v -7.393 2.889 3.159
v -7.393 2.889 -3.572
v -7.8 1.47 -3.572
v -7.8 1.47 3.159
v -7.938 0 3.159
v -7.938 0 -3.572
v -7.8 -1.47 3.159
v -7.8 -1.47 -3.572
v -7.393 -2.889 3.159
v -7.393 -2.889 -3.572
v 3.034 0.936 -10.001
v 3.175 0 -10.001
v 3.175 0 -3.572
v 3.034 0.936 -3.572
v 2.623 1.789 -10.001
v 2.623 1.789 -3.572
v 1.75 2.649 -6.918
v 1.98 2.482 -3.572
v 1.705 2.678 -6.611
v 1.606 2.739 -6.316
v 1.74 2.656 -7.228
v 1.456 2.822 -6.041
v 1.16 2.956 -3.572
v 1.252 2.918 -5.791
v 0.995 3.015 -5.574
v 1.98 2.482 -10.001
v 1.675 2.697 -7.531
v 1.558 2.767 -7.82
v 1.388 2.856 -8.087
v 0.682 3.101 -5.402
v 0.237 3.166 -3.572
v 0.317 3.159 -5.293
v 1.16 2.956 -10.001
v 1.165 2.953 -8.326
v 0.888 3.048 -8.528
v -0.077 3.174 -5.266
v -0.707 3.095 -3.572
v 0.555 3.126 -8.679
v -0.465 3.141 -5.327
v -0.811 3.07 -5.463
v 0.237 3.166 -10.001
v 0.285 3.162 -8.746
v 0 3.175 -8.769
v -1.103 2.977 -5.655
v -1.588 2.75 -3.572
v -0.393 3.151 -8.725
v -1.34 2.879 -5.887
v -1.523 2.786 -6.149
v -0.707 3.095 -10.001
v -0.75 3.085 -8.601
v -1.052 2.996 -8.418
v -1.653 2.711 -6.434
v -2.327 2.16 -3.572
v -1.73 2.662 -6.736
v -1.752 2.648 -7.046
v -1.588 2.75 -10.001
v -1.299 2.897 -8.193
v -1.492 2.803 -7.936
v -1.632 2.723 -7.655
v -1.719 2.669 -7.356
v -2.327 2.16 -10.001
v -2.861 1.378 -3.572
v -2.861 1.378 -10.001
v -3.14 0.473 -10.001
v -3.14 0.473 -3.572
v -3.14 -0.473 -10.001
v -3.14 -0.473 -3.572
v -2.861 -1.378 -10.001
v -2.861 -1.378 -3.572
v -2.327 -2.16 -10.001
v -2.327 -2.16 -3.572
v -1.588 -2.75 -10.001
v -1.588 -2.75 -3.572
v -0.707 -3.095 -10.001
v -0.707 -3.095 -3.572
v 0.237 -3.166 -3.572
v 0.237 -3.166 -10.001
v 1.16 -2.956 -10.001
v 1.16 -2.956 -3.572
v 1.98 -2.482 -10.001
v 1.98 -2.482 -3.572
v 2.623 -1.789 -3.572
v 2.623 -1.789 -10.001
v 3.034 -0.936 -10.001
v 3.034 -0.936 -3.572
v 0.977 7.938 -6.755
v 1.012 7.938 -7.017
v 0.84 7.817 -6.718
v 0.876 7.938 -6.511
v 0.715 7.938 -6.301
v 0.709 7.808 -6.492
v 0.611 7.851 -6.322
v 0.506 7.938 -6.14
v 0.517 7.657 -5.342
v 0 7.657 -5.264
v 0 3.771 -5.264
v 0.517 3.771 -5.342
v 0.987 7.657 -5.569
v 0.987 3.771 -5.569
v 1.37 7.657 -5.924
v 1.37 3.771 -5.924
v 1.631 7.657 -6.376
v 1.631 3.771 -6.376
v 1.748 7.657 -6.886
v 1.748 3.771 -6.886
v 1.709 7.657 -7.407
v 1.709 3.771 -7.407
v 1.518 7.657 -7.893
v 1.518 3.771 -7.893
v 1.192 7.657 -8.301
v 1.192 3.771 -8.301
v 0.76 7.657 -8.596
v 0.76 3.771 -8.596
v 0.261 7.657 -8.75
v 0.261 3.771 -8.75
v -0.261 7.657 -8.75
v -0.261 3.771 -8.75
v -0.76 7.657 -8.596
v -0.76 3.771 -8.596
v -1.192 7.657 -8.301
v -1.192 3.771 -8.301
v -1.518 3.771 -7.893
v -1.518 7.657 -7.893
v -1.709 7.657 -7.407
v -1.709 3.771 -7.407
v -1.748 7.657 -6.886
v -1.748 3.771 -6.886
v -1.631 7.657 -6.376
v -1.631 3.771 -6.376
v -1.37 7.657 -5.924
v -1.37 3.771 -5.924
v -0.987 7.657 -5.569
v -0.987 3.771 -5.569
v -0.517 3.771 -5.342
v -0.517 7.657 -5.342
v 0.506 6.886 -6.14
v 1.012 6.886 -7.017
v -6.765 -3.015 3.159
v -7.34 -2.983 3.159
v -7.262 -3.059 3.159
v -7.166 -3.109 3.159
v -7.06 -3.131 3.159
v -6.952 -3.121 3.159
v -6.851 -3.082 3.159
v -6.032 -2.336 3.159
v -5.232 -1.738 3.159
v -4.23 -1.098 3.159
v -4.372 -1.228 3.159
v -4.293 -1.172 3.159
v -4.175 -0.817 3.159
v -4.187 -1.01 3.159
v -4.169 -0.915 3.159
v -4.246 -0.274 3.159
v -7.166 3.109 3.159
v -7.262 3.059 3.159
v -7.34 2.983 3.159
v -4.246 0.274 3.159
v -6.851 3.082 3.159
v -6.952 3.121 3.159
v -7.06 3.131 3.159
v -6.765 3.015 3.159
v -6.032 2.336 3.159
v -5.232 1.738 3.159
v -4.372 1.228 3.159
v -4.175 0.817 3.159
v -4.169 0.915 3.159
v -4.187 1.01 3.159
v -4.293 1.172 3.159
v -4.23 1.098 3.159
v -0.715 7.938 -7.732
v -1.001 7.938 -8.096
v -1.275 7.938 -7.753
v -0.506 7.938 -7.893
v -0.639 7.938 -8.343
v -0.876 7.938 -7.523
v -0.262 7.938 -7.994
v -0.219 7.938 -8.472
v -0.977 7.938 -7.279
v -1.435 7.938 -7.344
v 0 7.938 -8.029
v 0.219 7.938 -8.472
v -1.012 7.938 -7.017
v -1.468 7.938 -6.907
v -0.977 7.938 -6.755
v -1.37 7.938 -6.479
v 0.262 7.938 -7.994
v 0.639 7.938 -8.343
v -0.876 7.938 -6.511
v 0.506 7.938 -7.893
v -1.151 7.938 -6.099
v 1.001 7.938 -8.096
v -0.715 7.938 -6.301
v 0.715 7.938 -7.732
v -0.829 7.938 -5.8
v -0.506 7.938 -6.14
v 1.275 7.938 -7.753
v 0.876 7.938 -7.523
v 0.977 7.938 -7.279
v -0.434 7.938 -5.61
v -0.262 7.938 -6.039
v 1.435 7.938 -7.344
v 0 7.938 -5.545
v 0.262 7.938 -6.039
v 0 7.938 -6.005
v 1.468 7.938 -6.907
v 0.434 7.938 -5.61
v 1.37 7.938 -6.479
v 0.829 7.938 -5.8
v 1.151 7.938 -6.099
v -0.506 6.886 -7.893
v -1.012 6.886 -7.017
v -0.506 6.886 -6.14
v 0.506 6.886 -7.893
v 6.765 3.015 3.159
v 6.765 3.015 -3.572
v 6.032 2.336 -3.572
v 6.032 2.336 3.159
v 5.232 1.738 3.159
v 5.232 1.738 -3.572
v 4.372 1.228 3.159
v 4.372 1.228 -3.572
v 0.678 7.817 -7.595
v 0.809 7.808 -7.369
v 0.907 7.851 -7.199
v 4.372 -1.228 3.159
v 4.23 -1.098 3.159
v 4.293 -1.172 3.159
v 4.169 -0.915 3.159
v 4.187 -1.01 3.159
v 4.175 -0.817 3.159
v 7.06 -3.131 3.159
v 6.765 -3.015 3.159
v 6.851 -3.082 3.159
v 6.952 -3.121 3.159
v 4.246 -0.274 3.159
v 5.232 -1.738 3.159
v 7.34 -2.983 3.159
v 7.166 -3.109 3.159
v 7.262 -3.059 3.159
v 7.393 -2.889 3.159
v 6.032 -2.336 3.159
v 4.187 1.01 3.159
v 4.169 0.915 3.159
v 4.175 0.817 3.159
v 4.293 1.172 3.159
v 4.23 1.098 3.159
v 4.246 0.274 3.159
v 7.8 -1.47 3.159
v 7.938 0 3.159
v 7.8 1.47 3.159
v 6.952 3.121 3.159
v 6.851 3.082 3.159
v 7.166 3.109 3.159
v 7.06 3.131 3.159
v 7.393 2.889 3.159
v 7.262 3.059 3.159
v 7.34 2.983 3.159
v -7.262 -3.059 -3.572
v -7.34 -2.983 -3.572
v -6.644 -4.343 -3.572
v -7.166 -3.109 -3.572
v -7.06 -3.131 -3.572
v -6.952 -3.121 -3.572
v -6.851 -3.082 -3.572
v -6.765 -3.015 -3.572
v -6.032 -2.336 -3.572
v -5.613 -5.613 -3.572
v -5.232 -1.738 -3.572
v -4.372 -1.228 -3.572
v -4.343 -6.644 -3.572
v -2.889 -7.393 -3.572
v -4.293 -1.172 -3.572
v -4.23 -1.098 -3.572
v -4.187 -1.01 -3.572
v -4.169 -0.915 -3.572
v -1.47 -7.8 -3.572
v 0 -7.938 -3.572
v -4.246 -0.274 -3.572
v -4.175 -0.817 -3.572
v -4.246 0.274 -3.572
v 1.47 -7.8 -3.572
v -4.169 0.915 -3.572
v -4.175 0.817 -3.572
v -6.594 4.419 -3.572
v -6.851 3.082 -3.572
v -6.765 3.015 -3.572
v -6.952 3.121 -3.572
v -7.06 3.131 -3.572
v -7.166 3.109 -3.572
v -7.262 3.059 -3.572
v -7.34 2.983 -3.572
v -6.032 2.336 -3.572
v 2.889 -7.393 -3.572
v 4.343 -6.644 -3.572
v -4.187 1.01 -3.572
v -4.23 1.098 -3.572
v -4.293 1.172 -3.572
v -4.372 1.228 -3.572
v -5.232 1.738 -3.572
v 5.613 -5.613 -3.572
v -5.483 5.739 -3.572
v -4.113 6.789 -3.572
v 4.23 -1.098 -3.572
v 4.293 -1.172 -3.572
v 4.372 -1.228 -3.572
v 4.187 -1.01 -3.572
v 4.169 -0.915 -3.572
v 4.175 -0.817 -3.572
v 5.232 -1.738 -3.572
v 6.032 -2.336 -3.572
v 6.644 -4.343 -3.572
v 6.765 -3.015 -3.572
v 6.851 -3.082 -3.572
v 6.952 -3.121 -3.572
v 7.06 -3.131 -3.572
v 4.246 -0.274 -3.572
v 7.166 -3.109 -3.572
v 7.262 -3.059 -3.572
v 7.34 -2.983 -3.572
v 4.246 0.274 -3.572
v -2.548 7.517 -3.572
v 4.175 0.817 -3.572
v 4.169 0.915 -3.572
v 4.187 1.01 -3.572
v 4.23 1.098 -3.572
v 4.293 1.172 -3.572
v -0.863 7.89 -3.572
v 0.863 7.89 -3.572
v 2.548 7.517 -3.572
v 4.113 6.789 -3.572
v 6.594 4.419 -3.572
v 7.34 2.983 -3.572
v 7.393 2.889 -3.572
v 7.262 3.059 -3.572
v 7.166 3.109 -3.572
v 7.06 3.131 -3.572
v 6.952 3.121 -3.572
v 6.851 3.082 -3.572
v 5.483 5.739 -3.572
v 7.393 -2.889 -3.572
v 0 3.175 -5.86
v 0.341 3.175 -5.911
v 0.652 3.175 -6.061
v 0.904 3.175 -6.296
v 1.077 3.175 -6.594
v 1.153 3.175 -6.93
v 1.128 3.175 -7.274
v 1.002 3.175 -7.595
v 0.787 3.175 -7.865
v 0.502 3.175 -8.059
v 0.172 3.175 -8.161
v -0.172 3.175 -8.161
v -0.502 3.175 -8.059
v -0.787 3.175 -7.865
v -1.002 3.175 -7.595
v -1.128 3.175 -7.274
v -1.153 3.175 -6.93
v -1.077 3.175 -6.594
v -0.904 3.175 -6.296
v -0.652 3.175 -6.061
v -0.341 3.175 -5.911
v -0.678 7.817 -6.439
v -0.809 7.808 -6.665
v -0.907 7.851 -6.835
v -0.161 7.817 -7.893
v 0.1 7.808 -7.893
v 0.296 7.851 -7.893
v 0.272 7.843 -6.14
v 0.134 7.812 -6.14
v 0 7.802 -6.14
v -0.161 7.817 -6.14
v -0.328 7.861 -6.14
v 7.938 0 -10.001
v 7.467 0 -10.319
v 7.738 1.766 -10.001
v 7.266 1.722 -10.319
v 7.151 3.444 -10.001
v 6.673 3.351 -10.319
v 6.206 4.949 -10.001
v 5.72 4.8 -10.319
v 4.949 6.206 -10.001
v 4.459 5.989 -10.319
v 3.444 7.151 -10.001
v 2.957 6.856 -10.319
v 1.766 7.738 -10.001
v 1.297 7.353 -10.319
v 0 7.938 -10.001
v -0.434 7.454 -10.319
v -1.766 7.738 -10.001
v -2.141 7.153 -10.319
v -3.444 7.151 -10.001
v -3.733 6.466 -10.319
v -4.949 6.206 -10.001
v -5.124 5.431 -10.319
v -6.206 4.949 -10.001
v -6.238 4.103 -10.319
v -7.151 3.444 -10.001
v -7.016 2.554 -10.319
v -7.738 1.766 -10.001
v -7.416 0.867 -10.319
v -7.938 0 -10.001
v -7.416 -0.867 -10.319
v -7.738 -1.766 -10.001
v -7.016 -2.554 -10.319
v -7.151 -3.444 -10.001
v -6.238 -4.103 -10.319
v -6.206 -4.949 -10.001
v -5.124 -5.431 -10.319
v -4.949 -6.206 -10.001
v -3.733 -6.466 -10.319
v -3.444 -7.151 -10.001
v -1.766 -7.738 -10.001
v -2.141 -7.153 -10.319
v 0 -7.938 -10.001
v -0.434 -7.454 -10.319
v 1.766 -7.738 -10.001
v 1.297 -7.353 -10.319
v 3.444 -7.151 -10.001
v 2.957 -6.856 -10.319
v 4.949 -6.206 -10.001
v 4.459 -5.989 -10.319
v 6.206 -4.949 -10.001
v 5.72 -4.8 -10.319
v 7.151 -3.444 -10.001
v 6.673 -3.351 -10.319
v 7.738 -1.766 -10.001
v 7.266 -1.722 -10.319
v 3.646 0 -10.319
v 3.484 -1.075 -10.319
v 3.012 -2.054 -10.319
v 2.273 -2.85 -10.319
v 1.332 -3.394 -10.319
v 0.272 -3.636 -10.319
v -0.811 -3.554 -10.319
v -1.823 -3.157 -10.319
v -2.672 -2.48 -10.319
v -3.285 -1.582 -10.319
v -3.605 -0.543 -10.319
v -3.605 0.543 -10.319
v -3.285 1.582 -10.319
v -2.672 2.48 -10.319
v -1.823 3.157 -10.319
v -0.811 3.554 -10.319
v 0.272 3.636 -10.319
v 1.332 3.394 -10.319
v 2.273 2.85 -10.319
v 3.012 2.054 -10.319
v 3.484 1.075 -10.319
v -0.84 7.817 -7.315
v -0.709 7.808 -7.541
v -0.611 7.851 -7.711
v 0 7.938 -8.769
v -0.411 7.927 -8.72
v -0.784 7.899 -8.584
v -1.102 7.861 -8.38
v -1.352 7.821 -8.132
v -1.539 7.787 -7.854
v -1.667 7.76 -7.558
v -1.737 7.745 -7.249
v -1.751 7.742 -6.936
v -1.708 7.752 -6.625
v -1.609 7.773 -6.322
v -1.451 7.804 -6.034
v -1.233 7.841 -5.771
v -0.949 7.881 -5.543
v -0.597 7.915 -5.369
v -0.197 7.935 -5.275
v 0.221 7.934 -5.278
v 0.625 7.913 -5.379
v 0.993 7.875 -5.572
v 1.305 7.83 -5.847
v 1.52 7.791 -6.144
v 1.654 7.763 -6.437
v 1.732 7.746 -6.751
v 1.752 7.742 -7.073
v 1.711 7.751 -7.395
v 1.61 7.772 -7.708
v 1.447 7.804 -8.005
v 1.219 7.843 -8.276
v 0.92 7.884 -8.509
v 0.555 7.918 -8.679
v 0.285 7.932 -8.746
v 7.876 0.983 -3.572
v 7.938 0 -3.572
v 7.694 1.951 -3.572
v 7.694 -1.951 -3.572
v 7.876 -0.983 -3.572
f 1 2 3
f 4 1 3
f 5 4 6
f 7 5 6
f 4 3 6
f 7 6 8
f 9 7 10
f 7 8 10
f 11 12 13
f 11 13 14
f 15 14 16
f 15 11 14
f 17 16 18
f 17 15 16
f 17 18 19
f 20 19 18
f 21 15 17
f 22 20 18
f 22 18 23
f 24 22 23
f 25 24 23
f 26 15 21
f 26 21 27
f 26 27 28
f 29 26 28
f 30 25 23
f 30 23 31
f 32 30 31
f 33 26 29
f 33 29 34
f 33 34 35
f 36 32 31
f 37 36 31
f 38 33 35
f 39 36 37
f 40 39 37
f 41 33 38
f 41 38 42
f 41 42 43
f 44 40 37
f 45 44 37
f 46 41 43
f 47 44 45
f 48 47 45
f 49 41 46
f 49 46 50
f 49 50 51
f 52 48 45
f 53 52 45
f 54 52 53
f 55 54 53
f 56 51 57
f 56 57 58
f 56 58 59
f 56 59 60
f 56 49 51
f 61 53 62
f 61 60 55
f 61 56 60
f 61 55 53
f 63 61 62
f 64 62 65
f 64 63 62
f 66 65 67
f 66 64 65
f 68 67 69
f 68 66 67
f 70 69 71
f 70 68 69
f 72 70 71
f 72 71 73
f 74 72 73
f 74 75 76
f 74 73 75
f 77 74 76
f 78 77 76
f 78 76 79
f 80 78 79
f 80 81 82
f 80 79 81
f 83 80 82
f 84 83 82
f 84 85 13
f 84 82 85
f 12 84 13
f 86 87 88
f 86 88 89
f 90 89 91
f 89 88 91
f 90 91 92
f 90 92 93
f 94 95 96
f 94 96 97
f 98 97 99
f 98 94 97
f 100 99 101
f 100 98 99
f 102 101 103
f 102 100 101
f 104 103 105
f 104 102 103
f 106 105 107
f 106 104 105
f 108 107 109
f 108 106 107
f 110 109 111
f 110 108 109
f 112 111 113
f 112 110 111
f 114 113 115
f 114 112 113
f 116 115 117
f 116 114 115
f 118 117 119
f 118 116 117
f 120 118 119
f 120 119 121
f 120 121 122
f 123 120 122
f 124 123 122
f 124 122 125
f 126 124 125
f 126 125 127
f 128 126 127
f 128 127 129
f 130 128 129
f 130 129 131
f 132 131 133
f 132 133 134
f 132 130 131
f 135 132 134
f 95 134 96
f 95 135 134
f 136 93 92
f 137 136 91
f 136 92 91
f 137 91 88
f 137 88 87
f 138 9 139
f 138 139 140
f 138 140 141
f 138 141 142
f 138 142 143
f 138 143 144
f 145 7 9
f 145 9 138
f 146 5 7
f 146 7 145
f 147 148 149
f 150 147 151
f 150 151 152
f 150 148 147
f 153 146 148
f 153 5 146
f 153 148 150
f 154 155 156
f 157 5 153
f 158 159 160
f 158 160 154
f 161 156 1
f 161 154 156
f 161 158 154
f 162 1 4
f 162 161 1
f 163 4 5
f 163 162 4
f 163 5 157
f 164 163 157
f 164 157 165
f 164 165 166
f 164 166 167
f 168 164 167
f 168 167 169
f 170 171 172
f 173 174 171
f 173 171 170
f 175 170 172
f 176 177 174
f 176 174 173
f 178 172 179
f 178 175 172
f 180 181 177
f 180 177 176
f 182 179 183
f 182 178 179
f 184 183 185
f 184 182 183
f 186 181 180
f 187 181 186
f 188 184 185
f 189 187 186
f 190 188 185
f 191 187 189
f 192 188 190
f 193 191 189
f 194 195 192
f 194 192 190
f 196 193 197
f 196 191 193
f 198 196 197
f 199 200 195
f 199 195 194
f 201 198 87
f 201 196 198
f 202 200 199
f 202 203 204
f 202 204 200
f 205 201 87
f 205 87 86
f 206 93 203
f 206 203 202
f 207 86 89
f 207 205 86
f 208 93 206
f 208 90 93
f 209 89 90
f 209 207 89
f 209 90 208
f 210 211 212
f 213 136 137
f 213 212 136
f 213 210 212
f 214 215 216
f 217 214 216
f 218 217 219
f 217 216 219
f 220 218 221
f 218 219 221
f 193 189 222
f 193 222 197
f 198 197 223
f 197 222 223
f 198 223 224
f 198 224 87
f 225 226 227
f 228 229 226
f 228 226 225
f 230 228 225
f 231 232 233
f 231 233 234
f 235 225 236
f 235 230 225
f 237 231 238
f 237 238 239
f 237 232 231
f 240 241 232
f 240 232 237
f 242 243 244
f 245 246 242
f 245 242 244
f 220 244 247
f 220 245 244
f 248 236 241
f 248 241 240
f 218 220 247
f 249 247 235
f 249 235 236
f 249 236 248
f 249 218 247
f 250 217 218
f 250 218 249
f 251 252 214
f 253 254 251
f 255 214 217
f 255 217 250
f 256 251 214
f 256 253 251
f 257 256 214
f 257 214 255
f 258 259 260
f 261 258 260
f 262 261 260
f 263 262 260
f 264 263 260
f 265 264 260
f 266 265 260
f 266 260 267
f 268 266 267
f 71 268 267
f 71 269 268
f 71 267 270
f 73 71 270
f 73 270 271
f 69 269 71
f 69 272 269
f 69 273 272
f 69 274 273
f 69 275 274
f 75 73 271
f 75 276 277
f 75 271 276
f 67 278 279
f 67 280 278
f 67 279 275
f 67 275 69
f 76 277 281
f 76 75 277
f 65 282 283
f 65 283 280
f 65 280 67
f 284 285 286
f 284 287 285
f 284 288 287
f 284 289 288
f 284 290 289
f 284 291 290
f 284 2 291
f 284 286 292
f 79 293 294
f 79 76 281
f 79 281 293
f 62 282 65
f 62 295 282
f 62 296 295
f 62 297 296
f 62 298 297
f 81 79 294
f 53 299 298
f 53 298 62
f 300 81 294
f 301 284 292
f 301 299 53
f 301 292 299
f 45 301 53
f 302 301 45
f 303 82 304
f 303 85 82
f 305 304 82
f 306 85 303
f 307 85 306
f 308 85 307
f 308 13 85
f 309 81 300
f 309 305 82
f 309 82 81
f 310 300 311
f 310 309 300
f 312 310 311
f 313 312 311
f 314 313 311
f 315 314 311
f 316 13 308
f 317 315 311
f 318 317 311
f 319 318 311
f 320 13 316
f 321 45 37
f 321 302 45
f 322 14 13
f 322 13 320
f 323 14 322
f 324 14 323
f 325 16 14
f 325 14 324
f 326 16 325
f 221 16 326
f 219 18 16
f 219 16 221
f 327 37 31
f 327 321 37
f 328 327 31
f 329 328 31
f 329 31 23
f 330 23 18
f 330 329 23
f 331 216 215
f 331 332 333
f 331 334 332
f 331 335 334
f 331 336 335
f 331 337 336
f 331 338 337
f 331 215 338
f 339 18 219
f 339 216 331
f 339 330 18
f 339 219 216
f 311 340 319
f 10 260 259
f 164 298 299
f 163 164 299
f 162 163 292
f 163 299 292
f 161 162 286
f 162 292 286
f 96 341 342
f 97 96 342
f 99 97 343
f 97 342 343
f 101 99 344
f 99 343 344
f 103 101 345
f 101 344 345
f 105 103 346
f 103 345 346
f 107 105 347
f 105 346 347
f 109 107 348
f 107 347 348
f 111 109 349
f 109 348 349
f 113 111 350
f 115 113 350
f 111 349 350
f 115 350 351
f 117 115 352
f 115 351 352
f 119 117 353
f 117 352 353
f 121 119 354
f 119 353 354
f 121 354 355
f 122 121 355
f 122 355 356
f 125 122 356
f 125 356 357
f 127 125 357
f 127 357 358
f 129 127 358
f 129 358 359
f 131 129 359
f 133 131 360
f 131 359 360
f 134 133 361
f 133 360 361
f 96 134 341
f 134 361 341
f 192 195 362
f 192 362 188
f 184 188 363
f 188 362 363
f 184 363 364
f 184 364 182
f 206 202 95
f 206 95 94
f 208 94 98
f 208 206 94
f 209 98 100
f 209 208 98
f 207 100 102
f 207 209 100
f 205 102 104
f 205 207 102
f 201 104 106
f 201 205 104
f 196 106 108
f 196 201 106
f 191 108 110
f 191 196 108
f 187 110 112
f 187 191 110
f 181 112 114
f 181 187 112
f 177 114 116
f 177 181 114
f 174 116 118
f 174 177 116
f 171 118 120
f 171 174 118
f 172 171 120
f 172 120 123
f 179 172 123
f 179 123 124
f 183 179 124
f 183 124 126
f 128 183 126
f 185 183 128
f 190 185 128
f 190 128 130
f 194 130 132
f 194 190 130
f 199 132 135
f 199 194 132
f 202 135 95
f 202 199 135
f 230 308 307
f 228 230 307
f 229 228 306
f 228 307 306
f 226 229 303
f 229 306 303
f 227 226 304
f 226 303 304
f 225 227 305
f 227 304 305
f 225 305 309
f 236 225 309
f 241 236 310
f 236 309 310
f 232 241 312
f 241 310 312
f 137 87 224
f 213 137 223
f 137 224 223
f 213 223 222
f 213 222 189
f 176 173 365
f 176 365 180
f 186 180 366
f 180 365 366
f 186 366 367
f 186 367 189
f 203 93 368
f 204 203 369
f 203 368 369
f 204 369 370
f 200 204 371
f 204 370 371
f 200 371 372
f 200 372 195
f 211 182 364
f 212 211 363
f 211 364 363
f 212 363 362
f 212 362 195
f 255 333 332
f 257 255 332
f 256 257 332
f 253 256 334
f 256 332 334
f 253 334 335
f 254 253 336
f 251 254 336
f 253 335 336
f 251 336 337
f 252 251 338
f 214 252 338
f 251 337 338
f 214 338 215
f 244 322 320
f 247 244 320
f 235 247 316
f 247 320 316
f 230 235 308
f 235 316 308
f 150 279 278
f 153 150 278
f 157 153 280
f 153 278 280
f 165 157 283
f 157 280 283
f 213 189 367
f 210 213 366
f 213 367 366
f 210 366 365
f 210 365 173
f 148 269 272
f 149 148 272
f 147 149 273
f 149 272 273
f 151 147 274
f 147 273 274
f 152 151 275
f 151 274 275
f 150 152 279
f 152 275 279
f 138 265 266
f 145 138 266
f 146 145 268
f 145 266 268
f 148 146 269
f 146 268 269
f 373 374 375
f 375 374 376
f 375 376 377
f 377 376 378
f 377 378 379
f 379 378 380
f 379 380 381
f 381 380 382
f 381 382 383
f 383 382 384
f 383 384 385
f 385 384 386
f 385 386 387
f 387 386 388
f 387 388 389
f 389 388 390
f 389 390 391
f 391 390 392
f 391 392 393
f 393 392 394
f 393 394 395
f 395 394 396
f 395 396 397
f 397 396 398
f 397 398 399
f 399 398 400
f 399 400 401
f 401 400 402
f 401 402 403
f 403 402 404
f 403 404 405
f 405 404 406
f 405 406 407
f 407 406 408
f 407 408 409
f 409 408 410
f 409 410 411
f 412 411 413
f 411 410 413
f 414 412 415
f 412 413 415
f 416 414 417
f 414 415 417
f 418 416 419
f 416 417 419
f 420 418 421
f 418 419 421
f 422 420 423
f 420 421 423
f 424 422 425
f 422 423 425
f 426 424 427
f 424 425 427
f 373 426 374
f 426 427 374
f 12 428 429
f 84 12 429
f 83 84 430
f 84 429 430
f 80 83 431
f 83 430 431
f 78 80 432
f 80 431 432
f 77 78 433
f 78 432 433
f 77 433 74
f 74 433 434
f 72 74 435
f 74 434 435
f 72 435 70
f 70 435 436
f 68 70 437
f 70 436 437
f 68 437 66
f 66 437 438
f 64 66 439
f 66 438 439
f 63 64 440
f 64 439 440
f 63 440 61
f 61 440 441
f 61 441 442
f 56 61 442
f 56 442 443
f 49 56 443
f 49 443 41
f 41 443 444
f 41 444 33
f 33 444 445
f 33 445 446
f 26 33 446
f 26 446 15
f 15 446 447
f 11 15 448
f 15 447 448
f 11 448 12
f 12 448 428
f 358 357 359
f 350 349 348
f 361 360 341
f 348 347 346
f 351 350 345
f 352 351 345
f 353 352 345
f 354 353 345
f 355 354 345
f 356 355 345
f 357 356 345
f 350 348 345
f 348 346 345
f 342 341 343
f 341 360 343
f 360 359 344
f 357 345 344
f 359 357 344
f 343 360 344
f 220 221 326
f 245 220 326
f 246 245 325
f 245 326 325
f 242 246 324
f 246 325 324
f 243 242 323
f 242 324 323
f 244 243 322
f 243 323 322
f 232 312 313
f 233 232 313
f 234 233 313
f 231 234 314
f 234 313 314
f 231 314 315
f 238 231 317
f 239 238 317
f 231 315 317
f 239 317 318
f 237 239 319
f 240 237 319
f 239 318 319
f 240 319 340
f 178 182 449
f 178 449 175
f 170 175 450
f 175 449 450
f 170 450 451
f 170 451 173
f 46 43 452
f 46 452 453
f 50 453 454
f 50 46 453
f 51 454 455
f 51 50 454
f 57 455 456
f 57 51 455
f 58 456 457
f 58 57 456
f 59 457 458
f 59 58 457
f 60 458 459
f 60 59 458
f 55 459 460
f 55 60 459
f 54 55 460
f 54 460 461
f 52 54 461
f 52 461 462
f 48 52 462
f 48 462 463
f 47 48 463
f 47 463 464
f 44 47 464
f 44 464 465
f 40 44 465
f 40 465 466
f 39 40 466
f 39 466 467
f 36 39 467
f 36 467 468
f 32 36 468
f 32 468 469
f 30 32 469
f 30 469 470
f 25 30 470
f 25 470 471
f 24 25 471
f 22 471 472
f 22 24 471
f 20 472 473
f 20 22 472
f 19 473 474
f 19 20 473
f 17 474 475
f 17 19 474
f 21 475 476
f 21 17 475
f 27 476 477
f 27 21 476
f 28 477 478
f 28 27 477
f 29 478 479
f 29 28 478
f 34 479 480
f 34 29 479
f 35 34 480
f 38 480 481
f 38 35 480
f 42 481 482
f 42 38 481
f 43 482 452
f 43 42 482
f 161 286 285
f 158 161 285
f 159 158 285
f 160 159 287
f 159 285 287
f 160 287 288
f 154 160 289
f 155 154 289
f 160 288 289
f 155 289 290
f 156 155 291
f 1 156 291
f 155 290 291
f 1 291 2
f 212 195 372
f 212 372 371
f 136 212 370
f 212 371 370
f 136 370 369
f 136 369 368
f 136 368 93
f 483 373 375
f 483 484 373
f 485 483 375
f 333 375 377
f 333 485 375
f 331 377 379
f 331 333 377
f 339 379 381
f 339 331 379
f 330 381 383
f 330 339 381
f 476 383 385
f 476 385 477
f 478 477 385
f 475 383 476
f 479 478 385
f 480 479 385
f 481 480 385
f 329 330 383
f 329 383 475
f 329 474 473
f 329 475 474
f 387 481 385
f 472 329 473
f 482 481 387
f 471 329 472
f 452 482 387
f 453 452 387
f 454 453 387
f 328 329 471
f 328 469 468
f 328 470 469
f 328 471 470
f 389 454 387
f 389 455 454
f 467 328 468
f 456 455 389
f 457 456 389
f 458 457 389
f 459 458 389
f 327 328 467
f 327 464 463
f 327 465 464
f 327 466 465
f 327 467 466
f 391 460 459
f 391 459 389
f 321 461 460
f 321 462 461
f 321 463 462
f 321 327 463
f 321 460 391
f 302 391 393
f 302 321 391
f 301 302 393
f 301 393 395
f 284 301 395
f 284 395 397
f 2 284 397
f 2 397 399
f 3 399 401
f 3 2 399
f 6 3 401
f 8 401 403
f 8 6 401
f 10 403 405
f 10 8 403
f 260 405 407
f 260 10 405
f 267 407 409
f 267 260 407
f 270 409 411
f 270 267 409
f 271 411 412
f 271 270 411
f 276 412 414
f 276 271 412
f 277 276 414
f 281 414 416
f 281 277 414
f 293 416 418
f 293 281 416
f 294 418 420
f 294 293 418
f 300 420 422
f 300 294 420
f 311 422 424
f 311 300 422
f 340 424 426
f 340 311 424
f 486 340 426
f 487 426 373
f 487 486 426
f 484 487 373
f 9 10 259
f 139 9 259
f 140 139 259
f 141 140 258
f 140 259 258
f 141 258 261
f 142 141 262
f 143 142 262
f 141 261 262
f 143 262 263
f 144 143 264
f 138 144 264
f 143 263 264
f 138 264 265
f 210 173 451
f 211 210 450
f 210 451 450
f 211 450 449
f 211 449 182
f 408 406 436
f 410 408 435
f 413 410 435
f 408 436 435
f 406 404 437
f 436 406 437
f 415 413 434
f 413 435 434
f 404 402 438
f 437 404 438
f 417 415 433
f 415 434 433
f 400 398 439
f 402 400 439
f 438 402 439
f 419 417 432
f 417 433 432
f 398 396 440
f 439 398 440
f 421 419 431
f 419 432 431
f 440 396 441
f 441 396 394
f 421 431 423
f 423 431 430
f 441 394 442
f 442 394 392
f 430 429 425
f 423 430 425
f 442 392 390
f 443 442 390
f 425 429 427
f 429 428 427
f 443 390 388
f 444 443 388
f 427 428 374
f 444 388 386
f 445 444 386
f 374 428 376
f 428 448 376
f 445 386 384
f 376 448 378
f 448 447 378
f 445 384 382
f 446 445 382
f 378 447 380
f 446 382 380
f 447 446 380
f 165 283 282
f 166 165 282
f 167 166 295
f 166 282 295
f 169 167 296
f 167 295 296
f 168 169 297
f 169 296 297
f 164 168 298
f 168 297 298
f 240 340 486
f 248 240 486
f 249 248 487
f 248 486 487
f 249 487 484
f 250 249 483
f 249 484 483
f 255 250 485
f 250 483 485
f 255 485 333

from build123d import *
from OCP.BRepFilletAPI import BRepFilletAPI_MakeChamfer
from build123d.topology import SkipClean

# Parameters (mm, degrees)
BOSS_EXTRUDE1_START     = -3.571875
SKETCH1_R               = 7.9375
BOSS_EXTRUDE1_DEPTH     = 6.746875
BOSS_EXTRUDE4_START     = 6.731
BOSS_EXTRUDE4_DEPTH     = 6.731
FILLET2_R               = 0.381
MOVE_START              = -3.571875
MOVE_FACE3_DEPTH        = 6.731
MOVE_FACE3_2_DEPTH      = 6.731
CIRPATTERN2_START       = -3.571875
CIRPATTERN2_DEPTH       = 6.731
CUT_EXTRUDE5_DEPTH      = 16.24743959
CUT_EXTRUDE5_DEPTH_BACK = 16.24743959
SKETCH15_R              = 3.175
CHAMFER1_SIZE           = 0.3175
CHAMFER1_SIZE2          = 0.470713108
SKETCH5_R               = 1.7526
CUT_EXTRUDE2_DEPTH      = 16.24743959
SKETCH6_R               = 1.7526
BOSS_EXTRUDE3_DEPTH     = 4.7625
CUT_EXTRUDE3_DEPTH      = 1.05156
CHAMFER3_SIZE           = 0.280416
CHAMFER4_SIZE           = 0.595884


# Read off the part's stored shape, not the designer's step: Move Face3, CirPattern2
with BuildPart() as part:
    # Sketch1 → Boss-Extrude1 (new body)
    with BuildSketch(Plane.XY.offset(BOSS_EXTRUDE1_START)):
        Circle(SKETCH1_R)
    extrude(amount=-BOSS_EXTRUDE1_DEPTH)

    # Sketch10 → Boss-Extrude4 (add)
    with BuildSketch(Plane.XY.offset(-3.571875).offset(BOSS_EXTRUDE4_START)):
        with BuildLine():
            ThreePointArc((-1.096318236, -4.110821886), (0, -4.2545), (1.096318236, -4.110821886))
            ThreePointArc((1.096318236, -4.110821886), (2.111997853, -5.752575517), (3.440933621, -7.152893266))
            ThreePointArc((3.440933621, -7.152893266), (0, -7.9375), (-3.440933621, -7.152893266))
            ThreePointArc((-3.440933621, -7.152893266), (-2.111997853, -5.752575517), (-1.096318236, -4.110821886))
        make_face()
    extrude(amount=-BOSS_EXTRUDE4_DEPTH)

    # Fillet2
    fillet2_edges = [part.edges().sort_by_distance(p)[0] for p in [
        (-3.440933621, -7.152893266, -0.206375),
        (3.440933621, -7.152893266, -0.206375),
        (-1.096318236, -4.110821886, -0.206375),
        (1.096318236, -4.110821886, -0.206375),
    ]]
    fillet(fillet2_edges, radius=FILLET2_R)

    # Move Face3 outline → Move Face3 (cut)
    with BuildSketch(Plane.XY.offset(MOVE_START)):
        with BuildLine():
            ThreePointArc((-3.015425868, -6.764758592), (-3.123679186, -7.113503156), (-2.888846251, -7.393136925))
            ThreePointArc((-2.888846251, -7.393136925), (0, -7.9375), (2.888846251, -7.393136925))
            ThreePointArc((2.888846251, -7.393136925), (3.123679186, -7.113503156), (3.015425868, -6.764758592))
            ThreePointArc((3.015425868, -6.764758592), (2.026423119, -5.639802857), (1.228164561, -4.372350642))
            ThreePointArc((1.228164561, -4.372350642), (1.055516359, -4.205643666), (0.817454229, -4.175229195))
            ThreePointArc((0.817454229, -4.175229195), (0, -4.2545), (-0.817454229, -4.175229195))
            ThreePointArc((-0.817454229, -4.175229195), (-1.055516359, -4.205643666), (-1.228164561, -4.372350642))
            ThreePointArc((-1.228164561, -4.372350642), (-2.026423119, -5.639802857), (-3.015425868, -6.764758592))
        make_face()
    extrude(amount=MOVE_FACE3_DEPTH, mode=Mode.SUBTRACT)

    # Move Face3 2 outline → Move Face3 2 (add)
    with SkipClean():  # the faces are left unmerged after this step: merging them gives an invalid solid
        with BuildSketch(Plane.XY.offset(MOVE_START)):
            with BuildLine():
                ThreePointArc((7.393136925, 2.888846251), (7.113503156, 3.123679186), (6.764758592, 3.015425868))
                ThreePointArc((6.764758592, 3.015425868), (5.639802857, 2.026423119), (4.372350642, 1.228164561))
                ThreePointArc((4.372350642, 1.228164561), (4.205643666, 1.055516359), (4.175229195, 0.817454229))
                ThreePointArc((4.175229195, 0.817454229), (4.2545, 0), (4.175229195, -0.817454229))
                ThreePointArc((4.175229195, -0.817454229), (4.205643666, -1.055516359), (4.372350642, -1.228164561))
                ThreePointArc((4.372350642, -1.228164561), (5.639802857, -2.026423119), (6.764758592, -3.015425868))
                ThreePointArc((6.764758592, -3.015425868), (7.113503156, -3.123679186), (7.393136925, -2.888846251))
                ThreePointArc((7.393136925, -2.888846251), (7.9375, 0), (7.393136925, 2.888846251))
            make_face()
        extrude(amount=MOVE_FACE3_2_DEPTH)

    # CirPattern2 outline → CirPattern2 (add)
    with SkipClean():  # the faces are left unmerged after this step: merging them gives an invalid solid
        with BuildSketch(Plane.XY.offset(CIRPATTERN2_START)):
            with BuildLine():
                ThreePointArc((-4.372350642, 1.228164561), (-5.639802857, 2.026423119), (-6.764758592, 3.015425868))
                ThreePointArc((-6.764758592, 3.015425868), (-7.113503156, 3.123679186), (-7.393136925, 2.888846251))
                ThreePointArc((-7.393136925, 2.888846251), (-7.9375, 0), (-7.393136925, -2.888846251))
                ThreePointArc((-7.393136925, -2.888846251), (-7.113503156, -3.123679186), (-6.764758592, -3.015425868))
                ThreePointArc((-6.764758592, -3.015425868), (-5.639802857, -2.026423119), (-4.372350642, -1.228164561))
                ThreePointArc((-4.372350642, -1.228164561), (-4.205643666, -1.055516359), (-4.175229195, -0.817454229))
                ThreePointArc((-4.175229195, -0.817454229), (-4.2545, 0), (-4.175229195, 0.817454229))
                ThreePointArc((-4.175229195, 0.817454229), (-4.205643666, 1.055516359), (-4.372350642, 1.228164561))
            make_face()
        extrude(amount=CIRPATTERN2_DEPTH)

    # Sketch15 → Cut-Extrude5 (cut, two sides: drawn at the far end of the back side and taken through both)
    with SkipClean():  # the faces are left unmerged after this step: merging them gives an invalid solid
        with BuildSketch(Plane.XY.offset(-CUT_EXTRUDE5_DEPTH_BACK)):
            Circle(SKETCH15_R)
        extrude(amount=CUT_EXTRUDE5_DEPTH + CUT_EXTRUDE5_DEPTH_BACK, mode=Mode.SUBTRACT)

    # Chamfer1: one chamfer whose edges measure the first distance from different faces: ONE call of the kernel's chamfer builder (chamfer() names one face for all edges)
    chamfer1_edges_1 = [part.edges().sort_by_distance(p)[0] for p in [
        (-7.9375, 0, -10.31875),
    ]]
    chamfer1_side_1 = [part.faces().sort_by_distance(p)[0] for p in [
        (-7.9375, 0, -6.9453125),
    ]]
    chamfer1_edges_2 = [part.edges().sort_by_distance(p)[0] for p in [
        (-3.175, 0, -10.31875),
    ]]
    chamfer1_side_2 = [part.faces().sort_by_distance(p)[0] for p in [
        (-3.175, 0, -6.9453125),
    ]]
    chamfer1 = BRepFilletAPI_MakeChamfer(part.part.solid().wrapped)
    for e in chamfer1_edges_1:
        chamfer1.Add(CHAMFER1_SIZE, CHAMFER1_SIZE2, e.wrapped, chamfer1_side_1[0].wrapped)  # the first distance lies on this face
    for e in chamfer1_edges_2:
        chamfer1.Add(CHAMFER1_SIZE, CHAMFER1_SIZE2, e.wrapped, chamfer1_side_2[0].wrapped)  # the first distance lies on this face
    add(Compound.cast(chamfer1.Shape()), mode=Mode.REPLACE)

    # Sketch5 → Cut-Extrude2 (cut, through all)
    with SkipClean():  # the faces are left unmerged after this step: merging them gives an invalid solid
        with BuildSketch(Plane(origin=(0, 0, 0), x_dir=(1, 0, 0), z_dir=(0, 1, 0))):
            with Locations(Location((0, 7.01675, 0), (0, 0, 90))):
                Circle(SKETCH5_R)
        extrude(amount=CUT_EXTRUDE2_DEPTH, mode=Mode.SUBTRACT)


with BuildPart() as body_2:
    # Sketch6 → Boss-Extrude3 (new body)
    with BuildSketch(Plane(origin=(0, 7.9375, 0), x_dir=(-1, 0, 0), z_dir=(0, 1, 0))):
        with Locations(Location((0, -7.01675, 0), (0, 0, 90))):
            Circle(SKETCH6_R)
    extrude(amount=-BOSS_EXTRUDE3_DEPTH)

    # Sketch8 → Cut-Extrude3 (cut)
    with BuildSketch(Plane(origin=(0, 7.9375, 0), x_dir=(1, 0, 0), z_dir=(0, 1, 0))):
        Polygon((0.505932041, 6.14045), (1.011864082, 7.01675), (0.505932041, 7.89305), (-0.505932041, 7.89305), (-1.011864082, 7.01675), (-0.505932041, 6.14045), align=None)
    extrude(amount=-CUT_EXTRUDE3_DEPTH, mode=Mode.SUBTRACT)

    # Cut-Extrude4 cone 1 section (through the dimple's axis) → Cut-Extrude4 (revolve, cut)
    with BuildSketch(Plane(origin=(0, 7.9375, -7.01675), x_dir=(0, 0, 1), z_dir=(1, 0, 0))):
        Polygon((0, 0), (1.011864082, 0), (0, 1.011864082), align=None)
    revolve(axis=Axis((0, 7.9375, -7.01675), (0, -1, 0)), mode=Mode.SUBTRACT)

    # Chamfer3
    chamfer3_edges = [body_2.edges().sort_by_distance(p)[0] for p in [
        (0, 7.9375, -8.76935),
    ]]
    chamfer(chamfer3_edges, length=CHAMFER3_SIZE)

    # Chamfer4
    chamfer4_edges = [body_2.edges().sort_by_distance(p)[0] for p in [
        (0, 3.175, -8.76935),
    ]]
    chamfer(chamfer4_edges, length=CHAMFER4_SIZE)


solid = Compound([part.part, body_2.part])
